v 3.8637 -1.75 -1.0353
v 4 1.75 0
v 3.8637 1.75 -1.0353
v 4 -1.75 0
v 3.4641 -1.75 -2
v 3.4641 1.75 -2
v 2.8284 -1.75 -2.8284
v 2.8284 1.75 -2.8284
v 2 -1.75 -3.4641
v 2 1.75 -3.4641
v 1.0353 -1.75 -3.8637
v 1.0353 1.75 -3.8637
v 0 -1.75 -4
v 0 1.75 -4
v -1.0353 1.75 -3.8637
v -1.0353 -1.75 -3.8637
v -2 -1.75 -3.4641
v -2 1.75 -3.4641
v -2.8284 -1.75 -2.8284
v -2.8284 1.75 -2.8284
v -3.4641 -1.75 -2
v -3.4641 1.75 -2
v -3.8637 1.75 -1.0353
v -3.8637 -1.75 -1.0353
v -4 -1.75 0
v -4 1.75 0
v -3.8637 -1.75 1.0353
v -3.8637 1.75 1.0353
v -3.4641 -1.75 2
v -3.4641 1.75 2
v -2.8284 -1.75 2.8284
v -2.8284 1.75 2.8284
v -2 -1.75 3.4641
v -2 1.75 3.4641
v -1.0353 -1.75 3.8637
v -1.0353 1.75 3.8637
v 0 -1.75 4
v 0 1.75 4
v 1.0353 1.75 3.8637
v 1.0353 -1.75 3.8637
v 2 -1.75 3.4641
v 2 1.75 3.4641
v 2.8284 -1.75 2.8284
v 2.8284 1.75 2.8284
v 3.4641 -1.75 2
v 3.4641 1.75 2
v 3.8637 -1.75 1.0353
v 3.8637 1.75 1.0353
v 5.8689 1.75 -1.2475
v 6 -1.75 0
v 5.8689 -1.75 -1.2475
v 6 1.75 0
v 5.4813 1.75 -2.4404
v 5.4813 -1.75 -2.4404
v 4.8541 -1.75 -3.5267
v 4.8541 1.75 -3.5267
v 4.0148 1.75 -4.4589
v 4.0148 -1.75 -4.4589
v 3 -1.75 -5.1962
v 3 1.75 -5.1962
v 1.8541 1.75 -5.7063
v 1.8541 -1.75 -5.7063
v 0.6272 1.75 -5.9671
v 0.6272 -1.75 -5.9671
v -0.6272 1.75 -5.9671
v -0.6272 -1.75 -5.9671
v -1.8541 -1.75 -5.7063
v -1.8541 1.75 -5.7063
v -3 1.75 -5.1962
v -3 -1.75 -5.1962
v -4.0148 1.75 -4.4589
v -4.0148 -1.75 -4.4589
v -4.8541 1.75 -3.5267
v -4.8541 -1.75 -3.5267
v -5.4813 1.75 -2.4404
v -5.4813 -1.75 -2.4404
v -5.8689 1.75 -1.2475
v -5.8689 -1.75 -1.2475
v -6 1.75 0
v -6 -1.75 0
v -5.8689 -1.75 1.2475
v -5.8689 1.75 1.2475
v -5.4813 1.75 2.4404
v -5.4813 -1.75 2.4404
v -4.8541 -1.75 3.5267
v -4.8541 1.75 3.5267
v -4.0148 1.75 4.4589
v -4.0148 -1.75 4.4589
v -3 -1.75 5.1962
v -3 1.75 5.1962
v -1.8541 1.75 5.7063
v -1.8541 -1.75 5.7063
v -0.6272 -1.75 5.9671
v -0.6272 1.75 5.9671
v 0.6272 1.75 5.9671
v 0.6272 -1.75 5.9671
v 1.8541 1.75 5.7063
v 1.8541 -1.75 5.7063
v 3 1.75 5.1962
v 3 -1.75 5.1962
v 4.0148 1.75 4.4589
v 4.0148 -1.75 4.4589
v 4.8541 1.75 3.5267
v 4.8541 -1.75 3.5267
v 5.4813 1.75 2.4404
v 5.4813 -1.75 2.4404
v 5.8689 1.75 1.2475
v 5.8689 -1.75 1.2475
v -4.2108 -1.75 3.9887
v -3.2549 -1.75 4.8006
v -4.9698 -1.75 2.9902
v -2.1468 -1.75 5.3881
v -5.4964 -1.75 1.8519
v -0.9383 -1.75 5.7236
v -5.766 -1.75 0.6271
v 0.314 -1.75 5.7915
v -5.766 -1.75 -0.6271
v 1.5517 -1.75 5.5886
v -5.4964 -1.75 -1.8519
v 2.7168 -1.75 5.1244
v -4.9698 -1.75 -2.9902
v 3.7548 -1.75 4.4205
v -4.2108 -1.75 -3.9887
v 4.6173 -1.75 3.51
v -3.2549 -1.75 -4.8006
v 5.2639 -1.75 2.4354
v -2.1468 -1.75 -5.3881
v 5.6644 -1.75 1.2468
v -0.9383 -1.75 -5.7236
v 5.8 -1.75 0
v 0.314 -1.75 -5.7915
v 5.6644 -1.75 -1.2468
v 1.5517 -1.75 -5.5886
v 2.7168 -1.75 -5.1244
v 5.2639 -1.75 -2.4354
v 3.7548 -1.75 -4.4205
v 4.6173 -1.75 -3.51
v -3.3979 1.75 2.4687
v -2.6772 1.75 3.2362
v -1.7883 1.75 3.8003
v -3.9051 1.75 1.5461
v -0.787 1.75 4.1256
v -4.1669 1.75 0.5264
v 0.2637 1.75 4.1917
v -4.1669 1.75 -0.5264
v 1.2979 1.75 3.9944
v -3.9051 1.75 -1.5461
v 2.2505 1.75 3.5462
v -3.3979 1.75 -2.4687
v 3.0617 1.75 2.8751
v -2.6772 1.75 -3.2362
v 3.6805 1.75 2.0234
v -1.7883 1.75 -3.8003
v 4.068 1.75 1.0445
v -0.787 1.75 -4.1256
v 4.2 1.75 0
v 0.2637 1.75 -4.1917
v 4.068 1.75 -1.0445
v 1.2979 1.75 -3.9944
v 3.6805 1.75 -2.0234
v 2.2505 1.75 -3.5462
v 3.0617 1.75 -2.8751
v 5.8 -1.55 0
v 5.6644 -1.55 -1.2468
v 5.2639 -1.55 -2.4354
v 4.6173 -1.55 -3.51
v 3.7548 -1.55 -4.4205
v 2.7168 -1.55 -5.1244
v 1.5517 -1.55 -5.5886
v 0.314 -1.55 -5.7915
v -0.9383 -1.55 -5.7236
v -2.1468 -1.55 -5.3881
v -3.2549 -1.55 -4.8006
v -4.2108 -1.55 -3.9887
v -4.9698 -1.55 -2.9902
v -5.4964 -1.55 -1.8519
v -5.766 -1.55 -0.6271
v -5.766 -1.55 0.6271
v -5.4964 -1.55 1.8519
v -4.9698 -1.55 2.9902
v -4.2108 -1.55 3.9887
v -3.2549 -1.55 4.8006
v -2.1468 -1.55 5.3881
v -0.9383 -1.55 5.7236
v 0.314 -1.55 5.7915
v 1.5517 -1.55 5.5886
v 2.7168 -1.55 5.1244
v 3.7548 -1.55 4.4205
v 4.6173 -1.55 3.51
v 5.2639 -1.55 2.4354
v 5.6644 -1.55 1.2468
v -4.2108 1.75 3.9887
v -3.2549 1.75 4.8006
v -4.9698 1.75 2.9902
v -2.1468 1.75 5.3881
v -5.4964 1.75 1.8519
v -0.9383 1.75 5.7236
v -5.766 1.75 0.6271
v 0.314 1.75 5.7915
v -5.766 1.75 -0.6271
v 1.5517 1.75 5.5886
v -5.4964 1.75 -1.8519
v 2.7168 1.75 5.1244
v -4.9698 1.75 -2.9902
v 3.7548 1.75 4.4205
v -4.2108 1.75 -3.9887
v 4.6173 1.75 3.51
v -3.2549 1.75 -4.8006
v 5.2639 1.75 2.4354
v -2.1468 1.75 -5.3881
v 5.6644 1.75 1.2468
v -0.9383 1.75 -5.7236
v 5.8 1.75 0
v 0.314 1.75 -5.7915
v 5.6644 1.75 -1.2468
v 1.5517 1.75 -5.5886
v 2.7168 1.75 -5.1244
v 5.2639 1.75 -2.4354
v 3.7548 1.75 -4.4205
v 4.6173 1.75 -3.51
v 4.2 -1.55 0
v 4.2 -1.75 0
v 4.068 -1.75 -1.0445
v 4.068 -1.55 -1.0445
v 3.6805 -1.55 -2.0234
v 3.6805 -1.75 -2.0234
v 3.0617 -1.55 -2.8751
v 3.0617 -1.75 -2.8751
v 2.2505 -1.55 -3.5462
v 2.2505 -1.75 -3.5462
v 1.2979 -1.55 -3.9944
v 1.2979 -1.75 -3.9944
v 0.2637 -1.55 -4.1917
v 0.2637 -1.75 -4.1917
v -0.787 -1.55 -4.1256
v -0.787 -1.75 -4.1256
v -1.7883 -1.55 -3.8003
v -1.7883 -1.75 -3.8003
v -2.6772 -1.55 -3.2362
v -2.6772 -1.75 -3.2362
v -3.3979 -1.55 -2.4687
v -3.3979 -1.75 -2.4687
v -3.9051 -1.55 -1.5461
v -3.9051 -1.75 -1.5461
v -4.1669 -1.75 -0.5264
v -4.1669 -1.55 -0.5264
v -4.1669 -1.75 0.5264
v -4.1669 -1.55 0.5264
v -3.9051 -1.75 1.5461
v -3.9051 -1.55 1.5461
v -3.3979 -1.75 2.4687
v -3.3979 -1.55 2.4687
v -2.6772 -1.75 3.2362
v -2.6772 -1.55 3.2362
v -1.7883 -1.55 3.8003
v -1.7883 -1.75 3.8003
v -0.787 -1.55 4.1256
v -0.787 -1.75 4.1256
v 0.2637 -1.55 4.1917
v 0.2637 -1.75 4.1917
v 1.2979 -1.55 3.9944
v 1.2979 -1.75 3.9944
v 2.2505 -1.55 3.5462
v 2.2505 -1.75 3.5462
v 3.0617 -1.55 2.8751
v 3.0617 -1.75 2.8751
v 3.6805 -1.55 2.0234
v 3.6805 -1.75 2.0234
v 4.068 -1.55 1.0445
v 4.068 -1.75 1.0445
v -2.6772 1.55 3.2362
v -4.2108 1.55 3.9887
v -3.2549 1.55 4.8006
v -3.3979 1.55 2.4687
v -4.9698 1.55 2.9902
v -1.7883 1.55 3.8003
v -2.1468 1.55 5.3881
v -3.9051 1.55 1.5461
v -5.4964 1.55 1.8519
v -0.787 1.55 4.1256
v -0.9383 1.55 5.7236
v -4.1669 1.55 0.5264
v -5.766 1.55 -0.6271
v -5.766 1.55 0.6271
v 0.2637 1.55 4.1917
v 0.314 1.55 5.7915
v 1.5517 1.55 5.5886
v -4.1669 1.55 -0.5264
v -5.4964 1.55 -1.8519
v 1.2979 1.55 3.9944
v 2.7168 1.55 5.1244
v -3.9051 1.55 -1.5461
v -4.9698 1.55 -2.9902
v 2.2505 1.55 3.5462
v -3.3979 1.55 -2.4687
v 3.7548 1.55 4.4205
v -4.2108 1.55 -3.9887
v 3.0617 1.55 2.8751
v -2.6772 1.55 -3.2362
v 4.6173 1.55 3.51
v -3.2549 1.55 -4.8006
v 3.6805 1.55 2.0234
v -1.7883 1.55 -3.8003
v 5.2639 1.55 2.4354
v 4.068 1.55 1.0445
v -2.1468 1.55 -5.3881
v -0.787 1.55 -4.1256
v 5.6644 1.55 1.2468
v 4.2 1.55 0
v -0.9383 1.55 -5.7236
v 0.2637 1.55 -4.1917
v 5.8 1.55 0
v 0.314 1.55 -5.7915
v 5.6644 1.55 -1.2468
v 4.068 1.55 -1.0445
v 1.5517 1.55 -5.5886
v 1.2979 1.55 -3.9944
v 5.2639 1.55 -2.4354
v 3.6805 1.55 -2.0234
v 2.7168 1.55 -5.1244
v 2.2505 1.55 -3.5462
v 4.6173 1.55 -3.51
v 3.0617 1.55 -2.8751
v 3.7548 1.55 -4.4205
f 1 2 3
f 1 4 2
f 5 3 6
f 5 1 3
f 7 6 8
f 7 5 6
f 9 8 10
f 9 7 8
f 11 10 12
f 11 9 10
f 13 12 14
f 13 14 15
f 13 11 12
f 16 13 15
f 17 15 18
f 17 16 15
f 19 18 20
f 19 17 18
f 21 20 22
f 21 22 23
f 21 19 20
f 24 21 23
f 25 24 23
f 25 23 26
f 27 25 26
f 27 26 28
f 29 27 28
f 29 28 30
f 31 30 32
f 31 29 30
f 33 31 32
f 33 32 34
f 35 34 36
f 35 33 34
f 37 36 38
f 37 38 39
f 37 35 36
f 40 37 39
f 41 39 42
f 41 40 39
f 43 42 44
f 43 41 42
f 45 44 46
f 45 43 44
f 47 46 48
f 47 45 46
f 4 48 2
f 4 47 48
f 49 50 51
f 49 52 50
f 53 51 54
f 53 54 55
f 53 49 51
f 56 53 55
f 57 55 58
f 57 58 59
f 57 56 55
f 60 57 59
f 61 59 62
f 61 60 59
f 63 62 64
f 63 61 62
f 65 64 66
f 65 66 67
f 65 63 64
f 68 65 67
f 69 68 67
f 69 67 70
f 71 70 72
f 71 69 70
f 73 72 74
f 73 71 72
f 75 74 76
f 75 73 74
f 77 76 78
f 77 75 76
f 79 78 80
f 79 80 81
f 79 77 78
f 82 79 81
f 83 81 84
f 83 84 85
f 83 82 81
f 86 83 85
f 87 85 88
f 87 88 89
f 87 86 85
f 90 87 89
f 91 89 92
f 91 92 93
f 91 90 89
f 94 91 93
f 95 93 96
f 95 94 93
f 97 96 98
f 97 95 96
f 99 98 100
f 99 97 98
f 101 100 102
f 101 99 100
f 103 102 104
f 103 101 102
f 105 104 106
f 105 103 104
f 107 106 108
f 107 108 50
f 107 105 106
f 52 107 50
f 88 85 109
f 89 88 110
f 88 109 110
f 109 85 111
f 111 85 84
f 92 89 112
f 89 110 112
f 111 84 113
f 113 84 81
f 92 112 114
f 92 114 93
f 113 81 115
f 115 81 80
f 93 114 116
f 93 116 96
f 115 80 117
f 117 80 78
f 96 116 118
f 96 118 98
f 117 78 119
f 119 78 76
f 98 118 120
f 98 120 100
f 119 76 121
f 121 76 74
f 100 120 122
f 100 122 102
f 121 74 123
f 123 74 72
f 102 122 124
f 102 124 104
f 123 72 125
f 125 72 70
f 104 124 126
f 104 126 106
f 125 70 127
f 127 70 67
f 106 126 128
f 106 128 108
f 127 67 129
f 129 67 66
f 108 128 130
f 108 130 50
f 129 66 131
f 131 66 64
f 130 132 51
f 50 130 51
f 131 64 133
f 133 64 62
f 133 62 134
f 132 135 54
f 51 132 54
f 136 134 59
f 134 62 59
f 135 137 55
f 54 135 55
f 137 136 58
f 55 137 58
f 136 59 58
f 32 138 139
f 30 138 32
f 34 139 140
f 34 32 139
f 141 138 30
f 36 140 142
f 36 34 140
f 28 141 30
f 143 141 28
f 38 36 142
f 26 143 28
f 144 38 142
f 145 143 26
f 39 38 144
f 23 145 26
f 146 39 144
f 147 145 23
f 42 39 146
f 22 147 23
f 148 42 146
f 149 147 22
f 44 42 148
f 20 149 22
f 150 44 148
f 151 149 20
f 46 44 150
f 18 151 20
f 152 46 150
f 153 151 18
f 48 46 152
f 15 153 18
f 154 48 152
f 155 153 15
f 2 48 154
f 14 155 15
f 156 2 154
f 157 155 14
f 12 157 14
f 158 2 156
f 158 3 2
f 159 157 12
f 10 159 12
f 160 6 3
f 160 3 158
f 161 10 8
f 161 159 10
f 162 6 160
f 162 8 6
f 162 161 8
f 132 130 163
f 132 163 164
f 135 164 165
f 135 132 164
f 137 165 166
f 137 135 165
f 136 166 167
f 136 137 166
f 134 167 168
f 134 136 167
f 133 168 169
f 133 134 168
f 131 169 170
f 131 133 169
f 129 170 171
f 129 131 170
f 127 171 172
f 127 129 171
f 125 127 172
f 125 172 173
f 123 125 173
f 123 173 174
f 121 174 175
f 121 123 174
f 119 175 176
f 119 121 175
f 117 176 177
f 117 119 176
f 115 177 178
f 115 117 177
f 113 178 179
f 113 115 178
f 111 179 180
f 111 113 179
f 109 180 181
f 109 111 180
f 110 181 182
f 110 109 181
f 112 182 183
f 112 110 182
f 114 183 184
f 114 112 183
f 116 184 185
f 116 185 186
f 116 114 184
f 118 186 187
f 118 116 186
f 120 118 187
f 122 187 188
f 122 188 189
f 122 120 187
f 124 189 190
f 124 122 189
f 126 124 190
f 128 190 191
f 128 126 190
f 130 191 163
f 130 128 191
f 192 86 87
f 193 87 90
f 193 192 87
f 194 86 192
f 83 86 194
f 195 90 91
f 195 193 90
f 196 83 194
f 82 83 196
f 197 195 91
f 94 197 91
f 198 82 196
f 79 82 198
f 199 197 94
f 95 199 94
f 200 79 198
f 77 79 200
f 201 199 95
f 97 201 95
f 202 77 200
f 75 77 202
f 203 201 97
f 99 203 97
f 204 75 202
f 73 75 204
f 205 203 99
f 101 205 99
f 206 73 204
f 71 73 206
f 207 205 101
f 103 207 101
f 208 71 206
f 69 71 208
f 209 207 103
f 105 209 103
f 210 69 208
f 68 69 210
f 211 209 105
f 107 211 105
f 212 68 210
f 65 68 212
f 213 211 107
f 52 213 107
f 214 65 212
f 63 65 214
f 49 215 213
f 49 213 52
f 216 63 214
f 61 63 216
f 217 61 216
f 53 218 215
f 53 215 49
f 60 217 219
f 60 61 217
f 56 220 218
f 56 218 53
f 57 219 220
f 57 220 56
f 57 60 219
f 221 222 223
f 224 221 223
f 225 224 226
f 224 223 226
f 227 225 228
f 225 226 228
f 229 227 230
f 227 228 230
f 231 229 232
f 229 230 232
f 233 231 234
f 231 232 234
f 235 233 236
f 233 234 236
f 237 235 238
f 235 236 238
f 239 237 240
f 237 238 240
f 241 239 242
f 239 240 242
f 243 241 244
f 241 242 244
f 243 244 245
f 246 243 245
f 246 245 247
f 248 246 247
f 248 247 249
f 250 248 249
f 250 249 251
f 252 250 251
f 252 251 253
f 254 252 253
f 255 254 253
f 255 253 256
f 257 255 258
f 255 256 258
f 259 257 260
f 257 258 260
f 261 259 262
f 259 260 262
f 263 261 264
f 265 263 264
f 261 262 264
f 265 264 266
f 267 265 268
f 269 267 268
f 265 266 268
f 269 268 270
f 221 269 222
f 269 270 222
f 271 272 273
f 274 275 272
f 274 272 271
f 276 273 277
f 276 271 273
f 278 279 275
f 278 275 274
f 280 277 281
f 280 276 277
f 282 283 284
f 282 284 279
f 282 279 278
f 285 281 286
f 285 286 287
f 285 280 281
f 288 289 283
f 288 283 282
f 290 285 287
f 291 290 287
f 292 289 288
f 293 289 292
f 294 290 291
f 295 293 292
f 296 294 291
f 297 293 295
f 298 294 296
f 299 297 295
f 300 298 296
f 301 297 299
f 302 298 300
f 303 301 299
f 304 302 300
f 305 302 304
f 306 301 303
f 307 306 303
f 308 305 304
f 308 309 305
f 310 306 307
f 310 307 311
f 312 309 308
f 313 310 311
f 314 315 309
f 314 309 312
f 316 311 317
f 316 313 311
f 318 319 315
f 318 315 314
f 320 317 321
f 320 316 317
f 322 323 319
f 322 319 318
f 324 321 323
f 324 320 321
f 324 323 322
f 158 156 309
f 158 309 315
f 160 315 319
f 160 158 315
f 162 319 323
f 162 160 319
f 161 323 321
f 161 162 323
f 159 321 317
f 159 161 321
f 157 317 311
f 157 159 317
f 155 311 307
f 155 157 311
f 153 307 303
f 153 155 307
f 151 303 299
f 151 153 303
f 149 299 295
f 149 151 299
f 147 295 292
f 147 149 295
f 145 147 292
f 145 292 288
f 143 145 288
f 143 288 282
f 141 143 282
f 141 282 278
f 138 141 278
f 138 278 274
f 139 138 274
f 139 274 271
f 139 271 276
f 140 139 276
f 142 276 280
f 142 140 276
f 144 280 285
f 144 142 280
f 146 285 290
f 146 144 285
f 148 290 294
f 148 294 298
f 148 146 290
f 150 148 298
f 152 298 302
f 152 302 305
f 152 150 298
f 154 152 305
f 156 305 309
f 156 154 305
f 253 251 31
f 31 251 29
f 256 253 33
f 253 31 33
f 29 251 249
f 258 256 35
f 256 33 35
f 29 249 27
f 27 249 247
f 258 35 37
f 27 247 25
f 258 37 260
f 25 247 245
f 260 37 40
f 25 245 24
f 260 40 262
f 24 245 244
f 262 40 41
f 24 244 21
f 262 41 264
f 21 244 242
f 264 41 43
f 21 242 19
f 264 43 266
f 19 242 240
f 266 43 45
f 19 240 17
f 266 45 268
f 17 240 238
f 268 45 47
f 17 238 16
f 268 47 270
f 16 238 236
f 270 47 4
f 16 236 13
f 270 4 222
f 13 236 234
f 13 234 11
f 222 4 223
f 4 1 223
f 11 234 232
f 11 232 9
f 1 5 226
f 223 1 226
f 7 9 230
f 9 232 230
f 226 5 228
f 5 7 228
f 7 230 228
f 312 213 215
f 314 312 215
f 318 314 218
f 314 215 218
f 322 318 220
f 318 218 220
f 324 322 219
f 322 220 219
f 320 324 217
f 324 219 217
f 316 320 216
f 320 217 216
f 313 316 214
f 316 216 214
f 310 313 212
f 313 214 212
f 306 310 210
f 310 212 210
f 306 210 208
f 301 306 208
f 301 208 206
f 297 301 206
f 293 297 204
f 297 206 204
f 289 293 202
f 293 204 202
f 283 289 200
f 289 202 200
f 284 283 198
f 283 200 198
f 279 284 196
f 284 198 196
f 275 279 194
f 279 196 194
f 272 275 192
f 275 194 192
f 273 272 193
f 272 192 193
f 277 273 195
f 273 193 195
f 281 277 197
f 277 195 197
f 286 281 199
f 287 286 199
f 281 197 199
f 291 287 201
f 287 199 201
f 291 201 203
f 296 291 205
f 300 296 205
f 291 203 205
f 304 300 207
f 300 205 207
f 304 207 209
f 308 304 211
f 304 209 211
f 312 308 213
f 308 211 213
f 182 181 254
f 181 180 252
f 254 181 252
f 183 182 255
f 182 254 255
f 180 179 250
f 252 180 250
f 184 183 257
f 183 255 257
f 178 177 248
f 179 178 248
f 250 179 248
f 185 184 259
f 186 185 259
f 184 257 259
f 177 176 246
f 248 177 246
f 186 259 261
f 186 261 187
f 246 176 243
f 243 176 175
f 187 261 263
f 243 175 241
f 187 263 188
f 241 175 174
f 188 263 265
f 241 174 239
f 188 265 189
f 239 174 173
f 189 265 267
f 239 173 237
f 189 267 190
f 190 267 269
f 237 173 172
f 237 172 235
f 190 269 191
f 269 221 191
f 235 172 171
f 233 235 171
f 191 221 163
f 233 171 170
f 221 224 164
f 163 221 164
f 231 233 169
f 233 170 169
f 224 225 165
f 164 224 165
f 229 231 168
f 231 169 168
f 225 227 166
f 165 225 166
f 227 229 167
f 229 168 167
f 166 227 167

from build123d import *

# Parameters (mm, degrees)
SKETCH1_R           = 6
SKETCH1_R_2         = 4
BOSS_EXTRUDE1_DEPTH = 1.75
SKETCH2_R           = 5.8
SKETCH2_R_2         = 4.2
CUT_EXTRUDE1_DEPTH  = 0.2


with BuildPart() as part:
    # Sketch1 → Boss-Extrude1 (new body, symmetric)
    with BuildSketch(Plane(origin=(0, 0, 0), x_dir=(1, 0, 0), z_dir=(0, 1, 0))):
        Circle(SKETCH1_R)
        Circle(SKETCH1_R_2, mode=Mode.SUBTRACT)
    extrude(amount=BOSS_EXTRUDE1_DEPTH, both=True)

    # Sketch2 → Cut-Extrude1 (cut)
    with BuildSketch(Plane(origin=(0, 1.75, 0), x_dir=(1, 0, 0), z_dir=(0, 1, 0))):
        Circle(SKETCH2_R)
        Circle(SKETCH2_R_2, mode=Mode.SUBTRACT)
    cut_extrude1 = extrude(amount=-CUT_EXTRUDE1_DEPTH, mode=Mode.SUBTRACT)

    # Mirror2: Cut-Extrude1 across plane
    add(cut_extrude1.mirror(Plane.ZX), mode=Mode.SUBTRACT)


solid = part.part
